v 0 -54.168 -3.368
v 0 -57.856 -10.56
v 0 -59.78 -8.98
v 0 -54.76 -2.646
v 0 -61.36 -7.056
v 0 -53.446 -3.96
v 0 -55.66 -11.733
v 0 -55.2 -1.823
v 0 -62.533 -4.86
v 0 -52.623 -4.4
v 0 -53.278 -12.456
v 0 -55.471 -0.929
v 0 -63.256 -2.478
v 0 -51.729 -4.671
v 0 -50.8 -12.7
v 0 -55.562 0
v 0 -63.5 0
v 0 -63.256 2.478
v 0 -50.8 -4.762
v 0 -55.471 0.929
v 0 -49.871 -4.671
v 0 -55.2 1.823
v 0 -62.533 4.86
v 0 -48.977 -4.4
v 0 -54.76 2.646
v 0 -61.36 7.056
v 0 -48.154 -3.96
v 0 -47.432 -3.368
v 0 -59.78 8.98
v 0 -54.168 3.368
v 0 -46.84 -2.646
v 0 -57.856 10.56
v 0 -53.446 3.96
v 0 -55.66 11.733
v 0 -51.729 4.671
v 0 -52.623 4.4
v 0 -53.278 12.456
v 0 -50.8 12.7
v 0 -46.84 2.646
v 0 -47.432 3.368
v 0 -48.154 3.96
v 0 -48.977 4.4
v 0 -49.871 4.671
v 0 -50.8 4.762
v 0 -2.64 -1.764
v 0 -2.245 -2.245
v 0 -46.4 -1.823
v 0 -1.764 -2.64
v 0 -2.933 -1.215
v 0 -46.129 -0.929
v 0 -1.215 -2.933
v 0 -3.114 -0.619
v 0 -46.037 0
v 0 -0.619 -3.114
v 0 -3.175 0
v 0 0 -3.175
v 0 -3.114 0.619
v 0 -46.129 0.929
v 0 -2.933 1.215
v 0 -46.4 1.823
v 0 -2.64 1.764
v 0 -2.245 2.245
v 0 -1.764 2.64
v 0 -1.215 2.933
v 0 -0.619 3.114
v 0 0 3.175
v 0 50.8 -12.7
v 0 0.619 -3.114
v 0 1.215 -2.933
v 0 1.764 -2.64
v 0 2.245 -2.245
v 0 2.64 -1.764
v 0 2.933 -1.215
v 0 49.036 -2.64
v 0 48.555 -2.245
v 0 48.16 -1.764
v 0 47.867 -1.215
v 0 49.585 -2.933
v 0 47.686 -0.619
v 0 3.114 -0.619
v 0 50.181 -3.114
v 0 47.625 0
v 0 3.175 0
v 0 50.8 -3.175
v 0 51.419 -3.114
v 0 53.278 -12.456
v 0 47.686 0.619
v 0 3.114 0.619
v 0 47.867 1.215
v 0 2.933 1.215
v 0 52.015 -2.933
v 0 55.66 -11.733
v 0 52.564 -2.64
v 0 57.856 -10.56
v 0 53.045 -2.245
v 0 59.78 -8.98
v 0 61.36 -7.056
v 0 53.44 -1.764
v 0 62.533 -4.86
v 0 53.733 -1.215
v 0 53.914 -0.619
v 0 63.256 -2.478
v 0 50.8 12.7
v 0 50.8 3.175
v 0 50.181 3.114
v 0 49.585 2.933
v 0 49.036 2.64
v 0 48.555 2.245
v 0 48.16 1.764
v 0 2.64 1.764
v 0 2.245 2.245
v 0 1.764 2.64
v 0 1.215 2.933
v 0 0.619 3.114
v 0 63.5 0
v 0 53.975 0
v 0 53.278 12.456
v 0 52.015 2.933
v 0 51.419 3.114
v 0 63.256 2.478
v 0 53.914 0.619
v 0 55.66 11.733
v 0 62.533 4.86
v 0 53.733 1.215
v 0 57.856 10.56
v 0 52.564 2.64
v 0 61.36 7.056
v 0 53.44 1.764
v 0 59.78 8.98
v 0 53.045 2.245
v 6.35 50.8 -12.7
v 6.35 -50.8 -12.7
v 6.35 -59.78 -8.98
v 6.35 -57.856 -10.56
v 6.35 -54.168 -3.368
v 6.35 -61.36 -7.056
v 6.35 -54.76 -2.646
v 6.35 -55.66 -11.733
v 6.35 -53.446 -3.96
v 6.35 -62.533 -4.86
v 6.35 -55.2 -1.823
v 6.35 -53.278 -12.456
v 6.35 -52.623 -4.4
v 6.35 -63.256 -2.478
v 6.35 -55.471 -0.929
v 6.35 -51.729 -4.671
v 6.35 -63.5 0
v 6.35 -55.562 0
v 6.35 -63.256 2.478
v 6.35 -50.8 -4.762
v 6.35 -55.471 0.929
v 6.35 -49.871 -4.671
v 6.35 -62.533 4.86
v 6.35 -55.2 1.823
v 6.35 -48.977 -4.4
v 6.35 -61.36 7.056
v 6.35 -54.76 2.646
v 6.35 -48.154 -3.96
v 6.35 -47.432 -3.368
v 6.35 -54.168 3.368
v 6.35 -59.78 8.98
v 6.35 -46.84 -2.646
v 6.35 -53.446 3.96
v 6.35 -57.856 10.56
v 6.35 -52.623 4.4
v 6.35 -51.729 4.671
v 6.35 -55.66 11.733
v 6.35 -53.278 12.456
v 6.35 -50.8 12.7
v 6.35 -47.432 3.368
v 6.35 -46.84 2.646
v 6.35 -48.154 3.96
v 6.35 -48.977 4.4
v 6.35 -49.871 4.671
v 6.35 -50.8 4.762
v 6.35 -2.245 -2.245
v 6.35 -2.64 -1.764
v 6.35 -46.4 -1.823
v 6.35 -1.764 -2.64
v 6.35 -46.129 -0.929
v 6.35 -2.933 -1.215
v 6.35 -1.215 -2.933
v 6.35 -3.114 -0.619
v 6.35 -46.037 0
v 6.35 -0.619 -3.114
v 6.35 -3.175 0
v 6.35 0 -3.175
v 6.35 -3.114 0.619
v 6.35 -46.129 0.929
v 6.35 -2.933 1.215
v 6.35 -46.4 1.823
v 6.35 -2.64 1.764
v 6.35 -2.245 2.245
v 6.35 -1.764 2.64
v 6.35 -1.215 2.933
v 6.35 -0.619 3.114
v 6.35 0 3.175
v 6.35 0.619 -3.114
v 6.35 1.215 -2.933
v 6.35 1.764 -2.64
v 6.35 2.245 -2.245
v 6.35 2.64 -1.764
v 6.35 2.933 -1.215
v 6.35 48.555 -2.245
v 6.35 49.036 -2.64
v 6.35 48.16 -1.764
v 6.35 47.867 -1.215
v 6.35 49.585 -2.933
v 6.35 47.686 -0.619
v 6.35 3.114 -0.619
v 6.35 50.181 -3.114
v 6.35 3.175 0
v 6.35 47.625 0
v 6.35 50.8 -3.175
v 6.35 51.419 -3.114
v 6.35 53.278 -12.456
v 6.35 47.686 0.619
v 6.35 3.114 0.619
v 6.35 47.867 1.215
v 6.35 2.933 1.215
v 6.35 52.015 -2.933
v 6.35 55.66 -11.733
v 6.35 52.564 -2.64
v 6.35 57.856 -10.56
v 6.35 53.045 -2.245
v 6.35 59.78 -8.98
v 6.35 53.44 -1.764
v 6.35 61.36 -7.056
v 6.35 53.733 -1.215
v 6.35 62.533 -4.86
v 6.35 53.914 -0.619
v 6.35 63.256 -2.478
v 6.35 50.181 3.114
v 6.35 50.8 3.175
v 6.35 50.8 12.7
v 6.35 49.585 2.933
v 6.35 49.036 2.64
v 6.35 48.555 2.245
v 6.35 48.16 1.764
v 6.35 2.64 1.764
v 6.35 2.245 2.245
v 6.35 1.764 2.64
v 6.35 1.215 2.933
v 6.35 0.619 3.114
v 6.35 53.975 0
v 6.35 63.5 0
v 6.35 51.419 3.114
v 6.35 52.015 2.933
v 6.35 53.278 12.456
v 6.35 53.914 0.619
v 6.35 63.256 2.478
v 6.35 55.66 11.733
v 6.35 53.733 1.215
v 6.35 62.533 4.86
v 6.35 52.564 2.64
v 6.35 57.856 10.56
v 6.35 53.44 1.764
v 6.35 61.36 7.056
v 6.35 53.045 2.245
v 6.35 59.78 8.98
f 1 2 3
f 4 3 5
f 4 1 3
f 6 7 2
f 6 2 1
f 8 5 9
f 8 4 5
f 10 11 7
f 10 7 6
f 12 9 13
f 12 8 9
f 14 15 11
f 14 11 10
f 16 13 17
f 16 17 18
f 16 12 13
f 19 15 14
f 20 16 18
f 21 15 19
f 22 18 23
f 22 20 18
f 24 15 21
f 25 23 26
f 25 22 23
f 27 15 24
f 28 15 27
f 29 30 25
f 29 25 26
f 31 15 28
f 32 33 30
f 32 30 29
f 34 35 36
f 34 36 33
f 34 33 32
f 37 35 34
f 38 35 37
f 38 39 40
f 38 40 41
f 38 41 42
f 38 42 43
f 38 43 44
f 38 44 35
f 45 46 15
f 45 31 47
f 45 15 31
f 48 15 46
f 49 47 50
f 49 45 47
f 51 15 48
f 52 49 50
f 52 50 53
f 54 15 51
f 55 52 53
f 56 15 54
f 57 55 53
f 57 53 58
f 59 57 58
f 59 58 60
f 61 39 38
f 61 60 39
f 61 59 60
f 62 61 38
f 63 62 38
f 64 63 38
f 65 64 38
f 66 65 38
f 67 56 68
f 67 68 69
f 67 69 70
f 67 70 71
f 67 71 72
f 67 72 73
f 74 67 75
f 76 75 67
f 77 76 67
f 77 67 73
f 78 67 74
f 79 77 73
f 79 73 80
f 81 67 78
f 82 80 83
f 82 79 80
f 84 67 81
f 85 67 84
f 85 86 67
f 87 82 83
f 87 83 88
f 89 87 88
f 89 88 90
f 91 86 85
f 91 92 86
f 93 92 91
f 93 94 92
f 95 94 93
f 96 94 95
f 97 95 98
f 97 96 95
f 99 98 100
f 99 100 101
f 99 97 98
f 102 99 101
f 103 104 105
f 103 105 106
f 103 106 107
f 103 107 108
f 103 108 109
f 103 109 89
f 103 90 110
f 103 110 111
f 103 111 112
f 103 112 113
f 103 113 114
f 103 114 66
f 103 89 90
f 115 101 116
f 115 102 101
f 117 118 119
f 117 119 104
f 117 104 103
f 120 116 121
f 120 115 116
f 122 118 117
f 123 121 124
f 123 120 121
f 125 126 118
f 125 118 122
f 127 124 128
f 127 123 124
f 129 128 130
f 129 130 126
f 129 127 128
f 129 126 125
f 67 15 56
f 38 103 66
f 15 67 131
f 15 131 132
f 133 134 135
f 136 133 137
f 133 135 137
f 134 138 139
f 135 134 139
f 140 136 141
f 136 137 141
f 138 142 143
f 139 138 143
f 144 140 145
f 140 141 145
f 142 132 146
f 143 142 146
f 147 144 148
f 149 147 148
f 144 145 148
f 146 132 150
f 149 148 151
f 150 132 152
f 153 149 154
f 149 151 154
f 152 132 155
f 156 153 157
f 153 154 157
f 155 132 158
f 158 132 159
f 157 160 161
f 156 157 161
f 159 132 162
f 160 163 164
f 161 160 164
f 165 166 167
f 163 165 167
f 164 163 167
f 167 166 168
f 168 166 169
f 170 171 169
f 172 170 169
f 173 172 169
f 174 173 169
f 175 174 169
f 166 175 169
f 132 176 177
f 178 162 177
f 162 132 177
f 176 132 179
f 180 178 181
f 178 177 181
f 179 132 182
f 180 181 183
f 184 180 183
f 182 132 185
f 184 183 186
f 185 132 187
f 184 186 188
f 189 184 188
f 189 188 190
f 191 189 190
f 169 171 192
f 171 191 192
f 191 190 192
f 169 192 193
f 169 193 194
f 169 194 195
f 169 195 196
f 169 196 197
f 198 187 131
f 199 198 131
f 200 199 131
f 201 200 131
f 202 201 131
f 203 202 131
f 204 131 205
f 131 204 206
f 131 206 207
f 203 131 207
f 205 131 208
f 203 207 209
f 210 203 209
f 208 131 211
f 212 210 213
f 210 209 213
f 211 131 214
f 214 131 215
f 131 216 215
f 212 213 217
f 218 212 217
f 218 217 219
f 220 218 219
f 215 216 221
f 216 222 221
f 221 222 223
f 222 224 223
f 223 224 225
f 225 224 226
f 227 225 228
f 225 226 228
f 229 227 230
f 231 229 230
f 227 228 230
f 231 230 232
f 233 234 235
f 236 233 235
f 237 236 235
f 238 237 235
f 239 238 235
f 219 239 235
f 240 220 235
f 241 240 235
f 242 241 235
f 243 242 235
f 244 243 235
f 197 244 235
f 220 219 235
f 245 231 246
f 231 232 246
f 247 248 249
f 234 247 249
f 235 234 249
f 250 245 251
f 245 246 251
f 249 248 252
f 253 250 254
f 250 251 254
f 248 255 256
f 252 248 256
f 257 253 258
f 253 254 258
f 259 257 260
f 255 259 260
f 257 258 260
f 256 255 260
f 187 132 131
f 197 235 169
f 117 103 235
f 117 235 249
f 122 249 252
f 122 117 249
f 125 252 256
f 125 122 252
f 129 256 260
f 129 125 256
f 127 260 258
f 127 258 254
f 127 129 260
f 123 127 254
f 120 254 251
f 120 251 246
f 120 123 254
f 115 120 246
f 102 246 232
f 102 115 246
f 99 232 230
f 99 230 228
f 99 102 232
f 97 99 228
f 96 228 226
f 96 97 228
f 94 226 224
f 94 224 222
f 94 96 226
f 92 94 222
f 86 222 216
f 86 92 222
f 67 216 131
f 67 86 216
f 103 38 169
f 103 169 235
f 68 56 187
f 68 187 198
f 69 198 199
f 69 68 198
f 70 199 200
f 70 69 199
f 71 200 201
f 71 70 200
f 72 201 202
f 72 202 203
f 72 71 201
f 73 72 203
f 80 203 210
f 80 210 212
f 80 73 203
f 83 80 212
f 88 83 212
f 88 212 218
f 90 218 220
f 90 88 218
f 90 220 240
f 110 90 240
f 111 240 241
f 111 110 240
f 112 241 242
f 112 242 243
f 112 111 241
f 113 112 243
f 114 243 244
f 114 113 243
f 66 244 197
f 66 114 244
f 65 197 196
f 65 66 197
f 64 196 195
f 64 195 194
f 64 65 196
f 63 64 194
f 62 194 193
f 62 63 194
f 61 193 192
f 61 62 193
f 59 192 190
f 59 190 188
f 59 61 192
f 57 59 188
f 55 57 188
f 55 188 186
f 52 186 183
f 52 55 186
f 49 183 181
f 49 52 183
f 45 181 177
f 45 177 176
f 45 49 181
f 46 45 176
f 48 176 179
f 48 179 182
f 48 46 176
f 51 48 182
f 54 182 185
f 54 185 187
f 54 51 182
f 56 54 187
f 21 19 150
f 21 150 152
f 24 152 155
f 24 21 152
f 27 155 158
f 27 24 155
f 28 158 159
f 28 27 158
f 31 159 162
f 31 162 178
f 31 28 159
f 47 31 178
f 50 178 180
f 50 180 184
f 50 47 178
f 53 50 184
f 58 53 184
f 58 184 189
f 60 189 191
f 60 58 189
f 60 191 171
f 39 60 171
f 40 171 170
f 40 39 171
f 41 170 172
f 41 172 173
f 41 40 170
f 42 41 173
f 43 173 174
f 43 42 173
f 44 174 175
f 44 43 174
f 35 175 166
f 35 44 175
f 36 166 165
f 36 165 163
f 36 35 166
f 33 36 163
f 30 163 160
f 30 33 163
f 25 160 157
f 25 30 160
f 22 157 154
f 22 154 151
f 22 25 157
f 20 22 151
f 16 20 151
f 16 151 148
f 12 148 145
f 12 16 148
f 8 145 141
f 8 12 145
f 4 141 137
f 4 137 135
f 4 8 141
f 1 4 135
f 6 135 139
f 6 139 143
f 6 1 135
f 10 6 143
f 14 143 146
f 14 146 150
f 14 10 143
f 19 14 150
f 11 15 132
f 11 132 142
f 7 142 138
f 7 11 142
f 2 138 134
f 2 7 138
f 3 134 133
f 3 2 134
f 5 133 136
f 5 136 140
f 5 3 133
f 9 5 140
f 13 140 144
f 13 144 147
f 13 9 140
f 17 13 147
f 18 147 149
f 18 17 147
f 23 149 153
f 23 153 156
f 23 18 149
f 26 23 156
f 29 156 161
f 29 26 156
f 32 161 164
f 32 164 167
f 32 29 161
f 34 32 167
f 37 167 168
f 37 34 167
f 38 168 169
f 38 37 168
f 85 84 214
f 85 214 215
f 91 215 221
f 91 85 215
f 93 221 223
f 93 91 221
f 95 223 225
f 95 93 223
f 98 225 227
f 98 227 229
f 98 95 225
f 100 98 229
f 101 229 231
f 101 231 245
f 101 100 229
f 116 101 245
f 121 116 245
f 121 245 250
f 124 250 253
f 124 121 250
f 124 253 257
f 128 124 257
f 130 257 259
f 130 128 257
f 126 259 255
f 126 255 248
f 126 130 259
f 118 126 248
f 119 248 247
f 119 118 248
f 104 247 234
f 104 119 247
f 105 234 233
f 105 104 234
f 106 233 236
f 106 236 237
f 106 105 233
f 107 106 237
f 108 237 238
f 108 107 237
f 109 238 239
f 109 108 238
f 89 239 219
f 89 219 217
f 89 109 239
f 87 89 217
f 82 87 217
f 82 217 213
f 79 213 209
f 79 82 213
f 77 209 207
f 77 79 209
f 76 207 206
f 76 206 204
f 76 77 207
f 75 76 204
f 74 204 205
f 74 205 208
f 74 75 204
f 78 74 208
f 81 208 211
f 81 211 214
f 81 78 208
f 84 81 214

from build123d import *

# Parameters (mm, degrees)
SKETCH1_R           = 3.175
SKETCH1_R_2         = 4.7625
BOSS_EXTRUDE1_DEPTH = 6.35


with BuildPart() as part:
    # Sketch1 → Boss-Extrude1 (new body)
    with BuildSketch(Plane(origin=(0, 0, 0), x_dir=(0, 0, -1), z_dir=(1, 0, 0))):
        with BuildLine():
            Line((12.7, 50.8), (12.7, -50.8))
            ThreePointArc((12.7, -50.8), (0, -63.5), (-12.7, -50.8))
            Line((-12.7, -50.8), (-12.7, 50.8))
            ThreePointArc((-12.7, 50.8), (0, 63.5), (12.7, 50.8))
        make_face()
        with Locations((0, 50.8)):
            Circle(SKETCH1_R, mode=Mode.SUBTRACT)
        Circle(SKETCH1_R, mode=Mode.SUBTRACT)
        with Locations((0, -50.8)):
            Circle(SKETCH1_R_2, mode=Mode.SUBTRACT)
    extrude(amount=BOSS_EXTRUDE1_DEPTH)


solid = part.part
